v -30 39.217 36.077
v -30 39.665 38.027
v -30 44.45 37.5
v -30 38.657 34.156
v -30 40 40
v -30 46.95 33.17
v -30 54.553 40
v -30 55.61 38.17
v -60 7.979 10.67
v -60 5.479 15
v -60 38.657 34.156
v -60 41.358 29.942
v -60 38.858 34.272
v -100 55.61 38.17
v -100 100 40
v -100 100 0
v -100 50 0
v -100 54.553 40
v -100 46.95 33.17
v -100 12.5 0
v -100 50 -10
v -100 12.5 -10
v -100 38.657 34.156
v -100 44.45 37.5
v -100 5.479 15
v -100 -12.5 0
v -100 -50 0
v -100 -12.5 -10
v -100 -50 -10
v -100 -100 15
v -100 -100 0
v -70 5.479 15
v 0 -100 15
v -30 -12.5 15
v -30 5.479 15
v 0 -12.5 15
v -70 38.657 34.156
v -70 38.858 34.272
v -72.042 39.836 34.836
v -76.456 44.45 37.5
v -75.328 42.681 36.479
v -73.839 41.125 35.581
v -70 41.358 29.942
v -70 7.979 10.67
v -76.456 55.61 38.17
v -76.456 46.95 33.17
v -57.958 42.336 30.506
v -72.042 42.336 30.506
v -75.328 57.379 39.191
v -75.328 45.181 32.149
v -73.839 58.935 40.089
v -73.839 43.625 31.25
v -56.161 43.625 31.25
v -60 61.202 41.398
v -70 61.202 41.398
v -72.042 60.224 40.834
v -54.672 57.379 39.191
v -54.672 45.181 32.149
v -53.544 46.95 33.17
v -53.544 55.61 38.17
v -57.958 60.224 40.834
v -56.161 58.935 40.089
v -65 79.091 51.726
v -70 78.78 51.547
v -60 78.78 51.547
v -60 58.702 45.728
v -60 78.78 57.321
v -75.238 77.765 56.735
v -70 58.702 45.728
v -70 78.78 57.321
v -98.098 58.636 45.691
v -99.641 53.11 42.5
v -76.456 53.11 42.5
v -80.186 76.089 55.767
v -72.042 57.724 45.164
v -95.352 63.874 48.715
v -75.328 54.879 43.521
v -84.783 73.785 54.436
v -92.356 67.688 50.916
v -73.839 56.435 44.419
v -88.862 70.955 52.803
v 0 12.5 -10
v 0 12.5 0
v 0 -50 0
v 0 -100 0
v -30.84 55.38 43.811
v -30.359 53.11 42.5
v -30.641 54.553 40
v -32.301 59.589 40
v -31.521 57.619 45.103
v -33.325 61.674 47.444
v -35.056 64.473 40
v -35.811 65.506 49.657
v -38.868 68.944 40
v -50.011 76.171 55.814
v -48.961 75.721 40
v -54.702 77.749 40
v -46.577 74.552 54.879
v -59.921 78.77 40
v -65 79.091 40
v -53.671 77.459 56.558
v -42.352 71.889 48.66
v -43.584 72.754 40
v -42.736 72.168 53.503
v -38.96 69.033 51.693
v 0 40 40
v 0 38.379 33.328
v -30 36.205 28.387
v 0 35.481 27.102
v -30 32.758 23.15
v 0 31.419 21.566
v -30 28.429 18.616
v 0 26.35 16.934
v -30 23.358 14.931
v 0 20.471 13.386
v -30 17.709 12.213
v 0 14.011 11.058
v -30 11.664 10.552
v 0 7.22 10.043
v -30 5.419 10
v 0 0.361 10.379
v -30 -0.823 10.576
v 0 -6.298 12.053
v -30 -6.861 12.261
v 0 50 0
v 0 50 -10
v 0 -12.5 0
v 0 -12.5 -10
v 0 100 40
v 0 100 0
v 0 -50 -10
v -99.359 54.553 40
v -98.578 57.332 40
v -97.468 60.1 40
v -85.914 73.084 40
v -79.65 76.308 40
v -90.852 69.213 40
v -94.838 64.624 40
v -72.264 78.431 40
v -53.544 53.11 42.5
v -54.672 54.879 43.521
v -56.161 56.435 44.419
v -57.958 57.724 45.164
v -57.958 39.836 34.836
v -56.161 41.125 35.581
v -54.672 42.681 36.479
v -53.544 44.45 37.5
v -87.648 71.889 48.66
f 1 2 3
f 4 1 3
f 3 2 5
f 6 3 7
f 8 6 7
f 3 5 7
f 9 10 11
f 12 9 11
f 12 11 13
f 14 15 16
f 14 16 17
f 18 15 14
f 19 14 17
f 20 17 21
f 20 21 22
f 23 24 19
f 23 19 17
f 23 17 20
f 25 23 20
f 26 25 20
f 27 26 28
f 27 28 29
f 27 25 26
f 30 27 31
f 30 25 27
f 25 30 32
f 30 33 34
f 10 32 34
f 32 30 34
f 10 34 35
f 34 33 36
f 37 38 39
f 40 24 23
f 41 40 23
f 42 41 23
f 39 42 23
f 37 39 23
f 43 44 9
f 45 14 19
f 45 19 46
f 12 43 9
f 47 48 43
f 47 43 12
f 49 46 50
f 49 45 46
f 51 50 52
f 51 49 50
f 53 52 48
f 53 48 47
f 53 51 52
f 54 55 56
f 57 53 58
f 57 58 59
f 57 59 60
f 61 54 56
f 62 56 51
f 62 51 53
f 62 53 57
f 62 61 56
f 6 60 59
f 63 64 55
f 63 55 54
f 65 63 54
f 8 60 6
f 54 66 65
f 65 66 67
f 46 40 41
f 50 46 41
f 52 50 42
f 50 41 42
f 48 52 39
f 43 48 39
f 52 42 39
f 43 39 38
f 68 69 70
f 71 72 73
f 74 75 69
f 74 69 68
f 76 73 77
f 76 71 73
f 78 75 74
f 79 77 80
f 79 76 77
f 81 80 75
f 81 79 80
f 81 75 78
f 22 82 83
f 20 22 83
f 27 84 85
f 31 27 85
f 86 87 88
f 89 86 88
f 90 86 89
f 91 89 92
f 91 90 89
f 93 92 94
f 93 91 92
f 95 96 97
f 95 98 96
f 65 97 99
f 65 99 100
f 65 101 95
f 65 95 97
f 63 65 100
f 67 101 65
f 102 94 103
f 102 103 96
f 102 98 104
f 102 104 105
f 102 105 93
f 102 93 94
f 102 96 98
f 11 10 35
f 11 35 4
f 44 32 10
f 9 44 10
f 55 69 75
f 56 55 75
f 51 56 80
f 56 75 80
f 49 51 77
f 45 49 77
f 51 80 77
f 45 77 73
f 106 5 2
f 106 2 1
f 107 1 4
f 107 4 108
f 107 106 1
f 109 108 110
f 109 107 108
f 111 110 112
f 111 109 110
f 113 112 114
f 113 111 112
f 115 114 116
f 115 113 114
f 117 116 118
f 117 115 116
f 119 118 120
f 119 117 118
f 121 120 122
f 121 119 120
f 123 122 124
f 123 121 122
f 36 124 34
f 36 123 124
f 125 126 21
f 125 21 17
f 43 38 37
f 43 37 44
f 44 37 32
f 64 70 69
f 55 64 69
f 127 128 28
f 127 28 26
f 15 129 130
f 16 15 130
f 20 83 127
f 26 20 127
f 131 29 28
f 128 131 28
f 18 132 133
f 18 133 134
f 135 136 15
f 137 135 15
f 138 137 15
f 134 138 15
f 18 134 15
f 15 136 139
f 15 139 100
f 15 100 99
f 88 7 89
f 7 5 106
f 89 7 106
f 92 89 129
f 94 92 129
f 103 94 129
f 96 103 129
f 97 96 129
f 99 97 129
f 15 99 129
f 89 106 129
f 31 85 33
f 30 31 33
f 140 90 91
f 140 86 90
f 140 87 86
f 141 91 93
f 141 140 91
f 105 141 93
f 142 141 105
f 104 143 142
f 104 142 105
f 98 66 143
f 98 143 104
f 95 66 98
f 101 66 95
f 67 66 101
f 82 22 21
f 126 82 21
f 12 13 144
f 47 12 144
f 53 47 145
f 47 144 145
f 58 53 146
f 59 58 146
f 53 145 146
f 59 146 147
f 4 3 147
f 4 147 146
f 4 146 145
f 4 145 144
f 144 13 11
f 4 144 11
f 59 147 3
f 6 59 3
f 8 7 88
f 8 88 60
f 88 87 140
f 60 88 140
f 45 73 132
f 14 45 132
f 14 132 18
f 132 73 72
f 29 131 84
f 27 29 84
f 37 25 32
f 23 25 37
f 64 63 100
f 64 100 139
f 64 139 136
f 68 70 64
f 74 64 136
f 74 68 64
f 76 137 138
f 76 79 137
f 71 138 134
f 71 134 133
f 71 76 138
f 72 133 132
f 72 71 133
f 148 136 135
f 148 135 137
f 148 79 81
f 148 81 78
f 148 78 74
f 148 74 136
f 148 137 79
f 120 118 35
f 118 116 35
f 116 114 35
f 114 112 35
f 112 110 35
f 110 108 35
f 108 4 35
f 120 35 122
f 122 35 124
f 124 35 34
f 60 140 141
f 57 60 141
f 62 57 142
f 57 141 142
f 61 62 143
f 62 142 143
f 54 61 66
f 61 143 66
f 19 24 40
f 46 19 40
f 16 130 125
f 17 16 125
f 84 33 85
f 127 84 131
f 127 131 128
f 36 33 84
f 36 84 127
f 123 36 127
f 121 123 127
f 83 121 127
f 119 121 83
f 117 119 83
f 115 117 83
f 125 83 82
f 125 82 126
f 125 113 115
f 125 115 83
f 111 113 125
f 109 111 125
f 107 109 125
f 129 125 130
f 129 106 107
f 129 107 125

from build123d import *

# Parameters (mm, degrees)
F1_DEPTH  = 30
F0_W      = 37.5
F0_H      = 10
F2_DEPTH  = 100
F4_DEPTH  = 70
F5_W      = 20.9091625453
F5_H      = 25
F6_DEPTH  = 70
F7_DEPTH  = 70
F9_DEPTH  = 5
F12_DEPTH = 17.5


with BuildPart() as f1:
    # F0 (on Right) → F1 (new body)
    with BuildSketch(Plane.YZ):
        with BuildLine():
            Line((-100, 15), (-100, 0))
            Line((-100, 0), (-50, 0))
            Line((-50, 0), (-12.5, 0))
            Line((-12.5, 0), (12.5, 0))
            Line((12.5, 0), (50, 0))
            Line((50, 0), (100, 0))
            Line((100, 0), (100, 40))
            Line((100, 40), (40, 40))
            ThreePointArc((40, 40), (20.4711584909, 13.3855671691), (-12.5, 15))
            Line((-12.5, 15), (-100, 15))
        make_face()
    extrude(amount=-F1_DEPTH)

    # F0 (on Right) → F2 (join)
    with BuildSketch(Plane.YZ):
        with Locations((-31.25, -5)):
            Rectangle(F0_W, F0_H)
        with Locations((31.25, -5)):
            Rectangle(F0_W, F0_H)
    extrude(amount=-F2_DEPTH)

    # F3 (on face) → F4 (join)
    with BuildSketch(Plane(origin=(-30, 0, 0), x_dir=(0, -1, 0), z_dir=(-1, 0, 0))):
        with BuildLine():
            Line((12.5, 15), (-23.473678133, 15))
            ThreePointArc((-23.473678133, 15), (-34.5610974405, 25.633015883), (-40, 40))
            Line((-40, 40), (-100, 40))
            Line((-100, 40), (-100, 0))
            Line((-100, 0), (-50, 0))
            Line((-50, 0), (-12.5, 0))
            Line((-12.5, 0), (12.5, 0))
            Line((12.5, 0), (50, 0))
            Line((50, 0), (100, 0))
            Line((100, 0), (100, 15))
            Line((100, 15), (12.5, 15))
        make_face()
    extrude(amount=F4_DEPTH)

    # F5 (on face) → F6 (join)
    with BuildSketch(Plane(origin=(-100, 0, 0), x_dir=(0, -1, 0), z_dir=(-1, 0, 0))):
        with BuildLine():
            Line((-23.473678133, 15), (-5.478678133, 15))
            Line((-5.478678133, 15), (-38.6573392432, 34.1557089233))
            ThreePointArc((-38.6573392432, 34.1557089233), (-32.7999061901, 23.2030943833), (-23.473678133, 15))
        make_face()
        with Locations((-89.5454187273, 27.5)):
            Rectangle(F5_W, F5_H)
        Polygon((-79.0908374547, 40), (-48.7799483222, 40), (-79.0908374547, 57.5), align=None)
    extrude(amount=-F6_DEPTH)

    # F5 (on face) → F7 (cut)
    with BuildSketch(Plane(origin=(-100, 0, 0), x_dir=(0, -1, 0), z_dir=(-1, 0, 0))):
        with BuildLine():
            Line((-48.7799483222, 40), (-38.6573392432, 34.1557089233))
            ThreePointArc((-38.6573392432, 34.1557089233), (-39.4545948044, 37.048924554), (-40, 40))
            Line((-40, 40), (-48.7799483222, 40))
        make_face()
    extrude(amount=-F7_DEPTH, mode=Mode.SUBTRACT)

    # F8 (on face) → F9 (cut)
    with BuildSketch(Plane(origin=(0, -5.1255209951, 8.8776627788), x_dir=(1, 0, 0), z_dir=(0, -0.5, 0.8660254038))):
        with BuildLine():
            Line((-85.9351158142, 57.2446744423), (-76.4564392374, 57.2446744423))
            ThreePointArc((-76.4564392374, 57.2446744423), (-77.5, 62.2446744423), (-76.4564392374, 67.2446744423))
            Line((-76.4564392374, 67.2446744423), (-85.9351158142, 67.2446744423))
            Line((-85.9351158142, 67.2446744423), (-99.6410161514, 67.2446744423))
            ThreePointArc((-99.6410161514, 67.2446744423), (-99.9101386799, 64.7511096302), (-100, 62.2446744423))
            ThreePointArc((-100, 62.2446744423), (-99.9101386799, 59.7382392545), (-99.6410161514, 57.2446744423))
            Line((-99.6410161514, 57.2446744423), (-85.9351158142, 57.2446744423))
        make_face()
        with BuildLine():
            Line((-60, 73.7011136797), (-60, 96.8856905937))
            ThreePointArc((-60, 96.8856905937), (-62.4935647997, 97.1548131213), (-64.999999975, 97.2446744423))
            ThreePointArc((-64.999999975, 97.2446744423), (-67.5064351754, 97.1548131231), (-70, 96.8856905937))
            Line((-70, 96.8856905937), (-70, 73.7011136797))
            ThreePointArc((-70, 73.7011136797), (-65, 74.7446744423), (-60, 73.7011136797))
        make_face()
        with BuildLine():
            Line((-70, 12.2446744423), (-60, 12.2446744423))
            Line((-60, 12.2446744423), (-60, 50.7882352049))
            ThreePointArc((-60, 50.7882352049), (-65, 49.7446744423), (-70, 50.7882352049))
            Line((-70, 50.7882352049), (-70, 12.2446744423))
        make_face()
        with BuildLine():
            ThreePointArc((-30.3589838486, 57.2446744423), (-30.0898613201, 59.7382392545), (-30, 62.2446744423))
            ThreePointArc((-30, 62.2446744423), (-30.0898613201, 64.7511096302), (-30.3589838486, 67.2446744423))
            Line((-30.3589838486, 67.2446744423), (-53.5435607626, 67.2446744423))
            ThreePointArc((-53.5435607626, 67.2446744423), (-52.7636710884, 64.7985449884), (-52.5, 62.2446744423))
            ThreePointArc((-52.5, 62.2446744423), (-52.7636710884, 59.6908038962), (-53.5435607626, 57.2446744423))
            Line((-53.5435607626, 57.2446744423), (-30.3589838486, 57.2446744423))
        make_face()
        with BuildLine():
            ThreePointArc((-64.999999975, 97.2446744423), (-62.4935647997, 97.1548131213), (-60, 96.8856905937))
            Line((-60, 96.8856905937), (-60, 97.2446744423))
            Line((-60, 97.2446744423), (-64.999999975, 97.2446744423))
        make_face()
        with BuildLine():
            ThreePointArc((-70, 96.8856905937), (-67.5064351754, 97.1548131231), (-64.999999975, 97.2446744423))
            Line((-64.999999975, 97.2446744423), (-70, 97.2446744423))
            Line((-70, 97.2446744423), (-70, 96.8856905937))
        make_face()
        with BuildLine():
            Line((-100, 67.2446744423), (-100, 62.2446744423))
            ThreePointArc((-100, 62.2446744423), (-99.9101386799, 64.7511096302), (-99.6410161514, 67.2446744423))
            Line((-99.6410161514, 67.2446744423), (-100, 67.2446744423))
        make_face()
        with BuildLine():
            Line((-100, 62.2446744423), (-100, 57.2446744423))
            Line((-100, 57.2446744423), (-99.6410161514, 57.2446744423))
            ThreePointArc((-99.6410161514, 57.2446744423), (-99.9101386799, 59.7382392545), (-100, 62.2446744423))
        make_face()
        with BuildLine():
            ThreePointArc((-30.3589838486, 67.2446744423), (-30.0898613201, 64.7511096302), (-30, 62.2446744423))
            Line((-30, 62.2446744423), (-30, 67.2446744423))
            Line((-30, 67.2446744423), (-30.3589838486, 67.2446744423))
        make_face()
        with BuildLine():
            Line((-30.3589838486, 57.2446744423), (-30, 57.2446744423))
            Line((-30, 57.2446744423), (-30, 62.2446744423))
            ThreePointArc((-30, 62.2446744423), (-30.0898613201, 59.7382392545), (-30.3589838486, 57.2446744423))
        make_face()
        with BuildLine():
            ThreePointArc((-70, 50.7882352049), (-65, 49.7446744423), (-60, 50.7882352049))
            ThreePointArc((-60, 50.7882352049), (-56.1611652352, 53.4058396775), (-53.5435607626, 57.2446744423))
            ThreePointArc((-53.5435607626, 57.2446744423), (-52.7636710884, 59.6908038962), (-52.5, 62.2446744423))
            ThreePointArc((-52.5, 62.2446744423), (-52.7636710884, 64.7985449884), (-53.5435607626, 67.2446744423))
            ThreePointArc((-53.5435607626, 67.2446744423), (-56.1611652352, 71.0835092071), (-60, 73.7011136797))
            ThreePointArc((-60, 73.7011136797), (-65, 74.7446744423), (-70, 73.7011136797))
            ThreePointArc((-70, 73.7011136797), (-73.8388347648, 71.0835092071), (-76.4564392374, 67.2446744423))
            ThreePointArc((-76.4564392374, 67.2446744423), (-77.5, 62.2446744423), (-76.4564392374, 57.2446744423))
            ThreePointArc((-76.4564392374, 57.2446744423), (-73.8388347648, 53.4058396775), (-70, 50.7882352049))
        make_face()
    extrude(amount=-F9_DEPTH, mode=Mode.SUBTRACT)

    # F11 (on offset) → F12 (cut)
    with BuildSketch(Plane.XY.offset(57.5)):
        with BuildLine():
            add(Edge.make_bspline(
                [(-65, 79.0908374547), (-100, 79.0908374547), (-100, 48.7799483222)],
                knots=[4.7123889804, 4.7123889804, 4.7123889804, 6.2831853072, 6.2831853072, 6.2831853072], degree=2, weights=[1, 0.7071067812, 1]))
            Line((-65, 79.0908374547), (-100, 79.0908374547))
            Line((-100, 79.0908374547), (-100, 48.7799483222))
        make_face()
        with BuildLine():
            Line((-30, 48.7799483222), (-30, 79.0908374547))
            Line((-30, 79.0908374547), (-65, 79.0908374547))
            add(Edge.make_bspline(
                [(-30, 48.7799483222), (-30, 79.0908374547), (-65, 79.0908374547)],
                knots=[3.1415926536, 3.1415926536, 3.1415926536, 4.7123889804, 4.7123889804, 4.7123889804], degree=2, weights=[1, 0.7071067812, 1]))
        make_face()
    extrude(amount=-F12_DEPTH, mode=Mode.SUBTRACT)


solid = f1.part
